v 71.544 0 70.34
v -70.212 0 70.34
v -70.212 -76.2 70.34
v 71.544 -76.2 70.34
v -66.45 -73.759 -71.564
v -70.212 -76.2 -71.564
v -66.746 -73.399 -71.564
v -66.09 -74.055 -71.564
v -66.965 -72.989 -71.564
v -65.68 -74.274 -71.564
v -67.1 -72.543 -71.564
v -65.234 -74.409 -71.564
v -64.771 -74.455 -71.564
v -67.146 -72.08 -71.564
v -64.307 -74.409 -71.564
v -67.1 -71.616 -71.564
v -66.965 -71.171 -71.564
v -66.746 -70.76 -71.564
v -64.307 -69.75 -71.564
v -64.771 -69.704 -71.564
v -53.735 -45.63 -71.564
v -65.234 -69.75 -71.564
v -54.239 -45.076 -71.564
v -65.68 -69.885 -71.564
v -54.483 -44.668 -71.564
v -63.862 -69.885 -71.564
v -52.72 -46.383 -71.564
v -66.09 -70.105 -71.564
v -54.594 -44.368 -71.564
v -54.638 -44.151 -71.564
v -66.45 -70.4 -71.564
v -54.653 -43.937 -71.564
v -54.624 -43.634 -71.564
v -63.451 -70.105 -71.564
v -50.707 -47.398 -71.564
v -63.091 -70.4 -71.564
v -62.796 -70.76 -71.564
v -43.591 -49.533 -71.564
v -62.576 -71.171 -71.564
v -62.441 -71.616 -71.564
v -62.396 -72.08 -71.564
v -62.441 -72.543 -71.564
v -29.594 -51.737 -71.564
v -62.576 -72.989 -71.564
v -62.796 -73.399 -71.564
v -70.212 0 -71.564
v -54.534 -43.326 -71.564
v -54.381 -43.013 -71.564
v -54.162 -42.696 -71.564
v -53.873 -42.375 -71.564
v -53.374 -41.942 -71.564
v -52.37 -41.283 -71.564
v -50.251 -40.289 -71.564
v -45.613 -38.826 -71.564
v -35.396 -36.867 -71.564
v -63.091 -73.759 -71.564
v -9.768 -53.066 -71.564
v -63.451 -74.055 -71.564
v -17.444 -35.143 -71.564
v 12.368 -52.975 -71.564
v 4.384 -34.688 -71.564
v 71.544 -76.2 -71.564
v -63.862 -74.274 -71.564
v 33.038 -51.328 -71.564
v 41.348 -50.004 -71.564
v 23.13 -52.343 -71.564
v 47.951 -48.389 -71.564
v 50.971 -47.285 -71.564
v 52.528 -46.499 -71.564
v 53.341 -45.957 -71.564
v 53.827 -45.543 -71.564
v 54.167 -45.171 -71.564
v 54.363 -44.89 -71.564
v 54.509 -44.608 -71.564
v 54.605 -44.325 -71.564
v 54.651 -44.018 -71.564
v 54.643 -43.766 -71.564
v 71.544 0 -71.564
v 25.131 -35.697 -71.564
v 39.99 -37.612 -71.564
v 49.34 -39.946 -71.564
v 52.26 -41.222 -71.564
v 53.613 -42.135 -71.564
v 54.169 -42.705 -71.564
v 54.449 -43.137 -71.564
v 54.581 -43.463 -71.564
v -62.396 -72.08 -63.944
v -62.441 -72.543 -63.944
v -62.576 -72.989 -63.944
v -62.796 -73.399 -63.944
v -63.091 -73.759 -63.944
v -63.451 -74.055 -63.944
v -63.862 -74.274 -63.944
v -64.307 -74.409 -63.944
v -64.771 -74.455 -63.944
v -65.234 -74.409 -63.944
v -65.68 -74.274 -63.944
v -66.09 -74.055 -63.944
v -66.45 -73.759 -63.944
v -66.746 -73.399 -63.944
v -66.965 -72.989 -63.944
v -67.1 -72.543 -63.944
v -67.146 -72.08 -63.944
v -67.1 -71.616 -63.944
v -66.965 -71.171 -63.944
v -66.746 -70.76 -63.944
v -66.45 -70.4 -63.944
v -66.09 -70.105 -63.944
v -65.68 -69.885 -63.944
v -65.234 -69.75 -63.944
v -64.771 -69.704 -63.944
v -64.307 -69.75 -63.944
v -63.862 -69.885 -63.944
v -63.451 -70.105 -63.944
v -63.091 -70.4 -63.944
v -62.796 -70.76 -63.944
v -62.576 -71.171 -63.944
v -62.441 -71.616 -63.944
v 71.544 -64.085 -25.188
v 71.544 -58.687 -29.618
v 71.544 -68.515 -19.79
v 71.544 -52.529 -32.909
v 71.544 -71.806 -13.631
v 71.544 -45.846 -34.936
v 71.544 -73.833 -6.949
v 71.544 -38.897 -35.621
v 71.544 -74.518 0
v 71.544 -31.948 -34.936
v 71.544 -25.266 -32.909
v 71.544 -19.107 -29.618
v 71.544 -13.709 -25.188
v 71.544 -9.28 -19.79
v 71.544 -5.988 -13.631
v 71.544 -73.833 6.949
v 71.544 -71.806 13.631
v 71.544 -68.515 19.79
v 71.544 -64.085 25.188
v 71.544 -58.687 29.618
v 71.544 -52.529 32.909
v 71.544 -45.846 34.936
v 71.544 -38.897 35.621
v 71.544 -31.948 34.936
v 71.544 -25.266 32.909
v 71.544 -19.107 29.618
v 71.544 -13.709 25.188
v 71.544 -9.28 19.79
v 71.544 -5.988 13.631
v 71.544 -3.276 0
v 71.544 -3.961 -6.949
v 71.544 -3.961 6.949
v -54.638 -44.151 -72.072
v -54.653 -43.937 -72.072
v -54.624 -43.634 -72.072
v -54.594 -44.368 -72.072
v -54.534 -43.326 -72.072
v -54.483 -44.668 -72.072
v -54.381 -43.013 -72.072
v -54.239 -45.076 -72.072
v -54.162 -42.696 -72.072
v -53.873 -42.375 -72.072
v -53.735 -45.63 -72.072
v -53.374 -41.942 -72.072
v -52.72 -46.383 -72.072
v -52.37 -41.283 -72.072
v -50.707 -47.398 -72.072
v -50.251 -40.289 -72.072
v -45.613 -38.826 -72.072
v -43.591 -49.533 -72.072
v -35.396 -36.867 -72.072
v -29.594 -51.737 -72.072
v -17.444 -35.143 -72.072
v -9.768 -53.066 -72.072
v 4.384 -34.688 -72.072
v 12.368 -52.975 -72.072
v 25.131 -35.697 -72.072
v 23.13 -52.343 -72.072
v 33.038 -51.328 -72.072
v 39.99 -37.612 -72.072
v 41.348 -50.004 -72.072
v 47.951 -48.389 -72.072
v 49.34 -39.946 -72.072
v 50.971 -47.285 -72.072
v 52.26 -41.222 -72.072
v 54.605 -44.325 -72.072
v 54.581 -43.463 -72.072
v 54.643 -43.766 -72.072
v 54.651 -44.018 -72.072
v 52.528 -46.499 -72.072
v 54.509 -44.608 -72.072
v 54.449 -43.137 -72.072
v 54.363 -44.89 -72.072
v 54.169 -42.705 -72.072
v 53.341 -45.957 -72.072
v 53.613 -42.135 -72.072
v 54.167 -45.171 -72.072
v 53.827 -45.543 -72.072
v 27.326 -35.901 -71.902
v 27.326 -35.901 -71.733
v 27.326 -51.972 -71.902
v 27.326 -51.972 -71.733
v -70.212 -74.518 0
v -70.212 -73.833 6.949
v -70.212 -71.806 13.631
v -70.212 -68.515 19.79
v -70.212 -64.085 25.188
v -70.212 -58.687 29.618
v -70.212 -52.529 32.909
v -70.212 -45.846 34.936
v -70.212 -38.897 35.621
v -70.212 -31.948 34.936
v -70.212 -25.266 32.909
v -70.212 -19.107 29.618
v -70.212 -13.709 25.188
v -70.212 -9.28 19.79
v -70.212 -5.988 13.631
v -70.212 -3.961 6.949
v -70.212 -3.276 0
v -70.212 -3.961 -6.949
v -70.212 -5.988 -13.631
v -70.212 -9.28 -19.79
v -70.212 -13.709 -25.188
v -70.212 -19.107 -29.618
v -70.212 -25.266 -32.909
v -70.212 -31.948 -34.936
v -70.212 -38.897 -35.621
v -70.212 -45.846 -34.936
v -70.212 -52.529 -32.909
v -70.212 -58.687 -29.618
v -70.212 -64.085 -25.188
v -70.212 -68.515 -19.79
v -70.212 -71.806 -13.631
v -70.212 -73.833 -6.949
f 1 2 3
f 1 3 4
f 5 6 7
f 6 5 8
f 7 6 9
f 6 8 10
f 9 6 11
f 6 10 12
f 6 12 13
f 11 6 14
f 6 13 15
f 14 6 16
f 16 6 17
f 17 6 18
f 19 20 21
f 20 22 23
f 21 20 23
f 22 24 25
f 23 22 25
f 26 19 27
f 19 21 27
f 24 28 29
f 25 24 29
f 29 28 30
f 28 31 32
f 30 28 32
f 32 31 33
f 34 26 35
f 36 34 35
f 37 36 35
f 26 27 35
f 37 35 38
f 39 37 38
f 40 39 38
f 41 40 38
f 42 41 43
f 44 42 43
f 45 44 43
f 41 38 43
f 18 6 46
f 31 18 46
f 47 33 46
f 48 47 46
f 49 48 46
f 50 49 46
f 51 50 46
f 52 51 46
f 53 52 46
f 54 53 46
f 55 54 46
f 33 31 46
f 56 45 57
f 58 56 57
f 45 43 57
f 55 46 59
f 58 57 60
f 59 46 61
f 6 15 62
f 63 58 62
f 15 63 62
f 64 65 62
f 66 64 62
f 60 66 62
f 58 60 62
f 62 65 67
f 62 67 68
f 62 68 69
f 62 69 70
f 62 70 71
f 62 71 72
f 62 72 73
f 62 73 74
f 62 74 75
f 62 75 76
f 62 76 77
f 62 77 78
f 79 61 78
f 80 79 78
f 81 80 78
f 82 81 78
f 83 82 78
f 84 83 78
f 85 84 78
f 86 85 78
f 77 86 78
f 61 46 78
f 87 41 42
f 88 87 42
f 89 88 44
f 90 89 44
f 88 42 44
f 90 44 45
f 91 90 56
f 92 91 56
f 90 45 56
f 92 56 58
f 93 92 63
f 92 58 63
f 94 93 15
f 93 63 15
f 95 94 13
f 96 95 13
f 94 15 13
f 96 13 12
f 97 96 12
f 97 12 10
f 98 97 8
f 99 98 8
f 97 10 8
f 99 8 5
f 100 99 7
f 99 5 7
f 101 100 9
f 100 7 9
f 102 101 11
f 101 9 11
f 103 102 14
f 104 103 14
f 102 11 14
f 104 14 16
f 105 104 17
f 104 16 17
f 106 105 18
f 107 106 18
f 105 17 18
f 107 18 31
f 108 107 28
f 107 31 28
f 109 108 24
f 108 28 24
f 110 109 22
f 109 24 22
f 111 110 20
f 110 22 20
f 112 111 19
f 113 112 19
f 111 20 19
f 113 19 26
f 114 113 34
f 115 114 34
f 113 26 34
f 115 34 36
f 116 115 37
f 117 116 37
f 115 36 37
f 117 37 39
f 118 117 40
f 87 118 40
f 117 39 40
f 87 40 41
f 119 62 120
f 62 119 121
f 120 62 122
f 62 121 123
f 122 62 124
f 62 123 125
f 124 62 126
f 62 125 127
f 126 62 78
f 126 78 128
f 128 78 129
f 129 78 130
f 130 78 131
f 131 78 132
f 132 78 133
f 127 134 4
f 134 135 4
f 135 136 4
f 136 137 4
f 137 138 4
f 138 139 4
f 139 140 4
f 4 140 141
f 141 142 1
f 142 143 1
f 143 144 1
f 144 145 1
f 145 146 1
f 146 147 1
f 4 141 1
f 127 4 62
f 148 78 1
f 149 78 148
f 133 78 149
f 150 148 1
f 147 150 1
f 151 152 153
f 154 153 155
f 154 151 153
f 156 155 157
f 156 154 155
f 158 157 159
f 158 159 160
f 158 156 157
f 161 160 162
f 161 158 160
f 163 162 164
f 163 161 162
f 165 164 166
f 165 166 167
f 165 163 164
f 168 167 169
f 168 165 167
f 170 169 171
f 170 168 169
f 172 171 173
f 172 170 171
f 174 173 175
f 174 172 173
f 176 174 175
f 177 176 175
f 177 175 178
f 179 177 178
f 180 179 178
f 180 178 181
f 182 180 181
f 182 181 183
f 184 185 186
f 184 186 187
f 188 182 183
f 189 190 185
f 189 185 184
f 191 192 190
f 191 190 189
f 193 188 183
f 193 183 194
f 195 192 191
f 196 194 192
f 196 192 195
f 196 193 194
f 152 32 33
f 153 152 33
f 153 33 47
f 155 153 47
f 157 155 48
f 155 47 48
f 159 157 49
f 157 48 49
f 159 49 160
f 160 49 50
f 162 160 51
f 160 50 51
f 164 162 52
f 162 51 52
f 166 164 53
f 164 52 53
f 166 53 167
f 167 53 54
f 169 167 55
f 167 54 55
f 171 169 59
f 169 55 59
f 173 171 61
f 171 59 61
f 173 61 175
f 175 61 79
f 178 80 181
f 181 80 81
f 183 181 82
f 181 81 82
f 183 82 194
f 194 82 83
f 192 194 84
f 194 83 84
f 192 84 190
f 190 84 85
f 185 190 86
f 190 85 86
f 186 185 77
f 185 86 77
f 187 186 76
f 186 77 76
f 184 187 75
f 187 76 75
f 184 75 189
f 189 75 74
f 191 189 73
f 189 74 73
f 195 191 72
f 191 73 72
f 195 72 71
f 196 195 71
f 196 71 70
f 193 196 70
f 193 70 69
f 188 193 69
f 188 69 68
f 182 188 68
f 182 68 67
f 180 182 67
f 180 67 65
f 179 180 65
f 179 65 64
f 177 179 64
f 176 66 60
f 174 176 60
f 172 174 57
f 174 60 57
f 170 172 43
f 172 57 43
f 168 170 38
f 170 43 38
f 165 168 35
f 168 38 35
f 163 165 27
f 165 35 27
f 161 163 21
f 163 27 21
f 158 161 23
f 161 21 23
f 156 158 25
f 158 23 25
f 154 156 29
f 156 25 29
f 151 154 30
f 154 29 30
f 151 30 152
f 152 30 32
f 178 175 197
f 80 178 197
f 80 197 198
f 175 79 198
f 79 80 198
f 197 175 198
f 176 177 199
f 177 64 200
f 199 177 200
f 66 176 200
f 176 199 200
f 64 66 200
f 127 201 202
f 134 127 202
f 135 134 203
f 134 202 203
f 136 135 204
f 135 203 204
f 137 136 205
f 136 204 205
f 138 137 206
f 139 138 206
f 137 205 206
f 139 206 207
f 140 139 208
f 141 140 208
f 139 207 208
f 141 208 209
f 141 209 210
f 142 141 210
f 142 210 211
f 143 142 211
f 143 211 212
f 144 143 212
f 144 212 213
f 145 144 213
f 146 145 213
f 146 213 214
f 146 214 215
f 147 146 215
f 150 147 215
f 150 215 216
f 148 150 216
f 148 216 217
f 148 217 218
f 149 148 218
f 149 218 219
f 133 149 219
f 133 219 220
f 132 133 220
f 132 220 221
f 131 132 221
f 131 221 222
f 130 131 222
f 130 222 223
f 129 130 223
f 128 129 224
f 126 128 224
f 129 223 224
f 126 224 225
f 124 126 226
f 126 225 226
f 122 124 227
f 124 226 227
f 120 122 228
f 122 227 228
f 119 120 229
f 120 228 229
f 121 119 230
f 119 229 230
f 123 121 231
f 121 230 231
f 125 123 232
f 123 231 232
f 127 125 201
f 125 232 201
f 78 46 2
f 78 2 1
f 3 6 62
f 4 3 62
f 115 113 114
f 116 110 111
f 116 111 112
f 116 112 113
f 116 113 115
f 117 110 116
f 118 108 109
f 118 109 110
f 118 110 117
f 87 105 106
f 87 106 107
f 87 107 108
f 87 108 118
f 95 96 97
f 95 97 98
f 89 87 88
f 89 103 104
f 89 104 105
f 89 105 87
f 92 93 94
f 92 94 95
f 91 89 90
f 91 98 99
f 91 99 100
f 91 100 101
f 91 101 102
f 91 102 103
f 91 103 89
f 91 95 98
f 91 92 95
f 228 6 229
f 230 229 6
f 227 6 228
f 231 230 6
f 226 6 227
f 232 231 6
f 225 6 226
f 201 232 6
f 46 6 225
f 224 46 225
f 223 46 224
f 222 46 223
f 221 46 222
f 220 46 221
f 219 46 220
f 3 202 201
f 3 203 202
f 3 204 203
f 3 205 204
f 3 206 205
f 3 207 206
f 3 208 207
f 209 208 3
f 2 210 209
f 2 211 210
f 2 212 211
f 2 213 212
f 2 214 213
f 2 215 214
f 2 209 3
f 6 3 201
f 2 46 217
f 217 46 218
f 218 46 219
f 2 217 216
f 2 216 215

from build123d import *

# Parameters (mm, degrees)
F0_W     = 141.7553946376
F0_H     = 141.903989017
F1_DEPTH = 76.2
F2_R     = 35.6206675953
F3_DEPTH = 152.4
F5_DEPTH = 0.508
F6_R     = 2.3752413704
F7_DEPTH = 7.62


with BuildPart() as f1:
    # F0 (on Front) → F1 (new body)
    with BuildSketch(Plane.XZ):
        with Locations((0.6661005318, -0.6118379533)):
            Rectangle(F0_W, F0_H)
    extrude(amount=F1_DEPTH)

    # F2 (on face) → F3 (cut)
    with BuildSketch(Plane(origin=(-70.211596787, 0, 0), x_dir=(0, -1, 0), z_dir=(-1, 0, 0))):
        with Locations((38.8970784843, 0)):
            Circle(F2_R)
    extrude(amount=-F3_DEPTH, mode=Mode.SUBTRACT)

    # F4 (on face) → F5 (join)
    with BuildSketch(Plane(origin=(0, 0, -71.5638324618), x_dir=(1, 0, 0), z_dir=(0, 0, -1))):
        with BuildLine():
            add(Edge.make_bspline(
                [(-54.6526201069, 43.9366996288), (-54.6526201069, 27.8657274233), (27.3263100535, 35.901213526), (109.3052402139, 43.9366996288), (27.3263100535, 51.9721857316), (-54.6526201069, 60.0076718344), (-54.6526201069, 43.9366996288)],
                knots=[0, 0, 0, 2.0943951024, 2.0943951024, 4.1887902048, 4.1887902048, 6.2831853072, 6.2831853072, 6.2831853072], degree=2, weights=[1, 0.5, 1, 0.5, 1, 0.5, 1]))
        make_face()
    extrude(amount=F5_DEPTH)

    # F6 (on face) → F7 (cut)
    with BuildSketch(Plane(origin=(0, 0, -71.5638324618), x_dir=(1, 0, 0), z_dir=(0, 0, -1))):
        with Locations((-64.7707954049, 72.0797255635)):
            Circle(F6_R)
    extrude(amount=-F7_DEPTH, mode=Mode.SUBTRACT)


solid = f1.part
